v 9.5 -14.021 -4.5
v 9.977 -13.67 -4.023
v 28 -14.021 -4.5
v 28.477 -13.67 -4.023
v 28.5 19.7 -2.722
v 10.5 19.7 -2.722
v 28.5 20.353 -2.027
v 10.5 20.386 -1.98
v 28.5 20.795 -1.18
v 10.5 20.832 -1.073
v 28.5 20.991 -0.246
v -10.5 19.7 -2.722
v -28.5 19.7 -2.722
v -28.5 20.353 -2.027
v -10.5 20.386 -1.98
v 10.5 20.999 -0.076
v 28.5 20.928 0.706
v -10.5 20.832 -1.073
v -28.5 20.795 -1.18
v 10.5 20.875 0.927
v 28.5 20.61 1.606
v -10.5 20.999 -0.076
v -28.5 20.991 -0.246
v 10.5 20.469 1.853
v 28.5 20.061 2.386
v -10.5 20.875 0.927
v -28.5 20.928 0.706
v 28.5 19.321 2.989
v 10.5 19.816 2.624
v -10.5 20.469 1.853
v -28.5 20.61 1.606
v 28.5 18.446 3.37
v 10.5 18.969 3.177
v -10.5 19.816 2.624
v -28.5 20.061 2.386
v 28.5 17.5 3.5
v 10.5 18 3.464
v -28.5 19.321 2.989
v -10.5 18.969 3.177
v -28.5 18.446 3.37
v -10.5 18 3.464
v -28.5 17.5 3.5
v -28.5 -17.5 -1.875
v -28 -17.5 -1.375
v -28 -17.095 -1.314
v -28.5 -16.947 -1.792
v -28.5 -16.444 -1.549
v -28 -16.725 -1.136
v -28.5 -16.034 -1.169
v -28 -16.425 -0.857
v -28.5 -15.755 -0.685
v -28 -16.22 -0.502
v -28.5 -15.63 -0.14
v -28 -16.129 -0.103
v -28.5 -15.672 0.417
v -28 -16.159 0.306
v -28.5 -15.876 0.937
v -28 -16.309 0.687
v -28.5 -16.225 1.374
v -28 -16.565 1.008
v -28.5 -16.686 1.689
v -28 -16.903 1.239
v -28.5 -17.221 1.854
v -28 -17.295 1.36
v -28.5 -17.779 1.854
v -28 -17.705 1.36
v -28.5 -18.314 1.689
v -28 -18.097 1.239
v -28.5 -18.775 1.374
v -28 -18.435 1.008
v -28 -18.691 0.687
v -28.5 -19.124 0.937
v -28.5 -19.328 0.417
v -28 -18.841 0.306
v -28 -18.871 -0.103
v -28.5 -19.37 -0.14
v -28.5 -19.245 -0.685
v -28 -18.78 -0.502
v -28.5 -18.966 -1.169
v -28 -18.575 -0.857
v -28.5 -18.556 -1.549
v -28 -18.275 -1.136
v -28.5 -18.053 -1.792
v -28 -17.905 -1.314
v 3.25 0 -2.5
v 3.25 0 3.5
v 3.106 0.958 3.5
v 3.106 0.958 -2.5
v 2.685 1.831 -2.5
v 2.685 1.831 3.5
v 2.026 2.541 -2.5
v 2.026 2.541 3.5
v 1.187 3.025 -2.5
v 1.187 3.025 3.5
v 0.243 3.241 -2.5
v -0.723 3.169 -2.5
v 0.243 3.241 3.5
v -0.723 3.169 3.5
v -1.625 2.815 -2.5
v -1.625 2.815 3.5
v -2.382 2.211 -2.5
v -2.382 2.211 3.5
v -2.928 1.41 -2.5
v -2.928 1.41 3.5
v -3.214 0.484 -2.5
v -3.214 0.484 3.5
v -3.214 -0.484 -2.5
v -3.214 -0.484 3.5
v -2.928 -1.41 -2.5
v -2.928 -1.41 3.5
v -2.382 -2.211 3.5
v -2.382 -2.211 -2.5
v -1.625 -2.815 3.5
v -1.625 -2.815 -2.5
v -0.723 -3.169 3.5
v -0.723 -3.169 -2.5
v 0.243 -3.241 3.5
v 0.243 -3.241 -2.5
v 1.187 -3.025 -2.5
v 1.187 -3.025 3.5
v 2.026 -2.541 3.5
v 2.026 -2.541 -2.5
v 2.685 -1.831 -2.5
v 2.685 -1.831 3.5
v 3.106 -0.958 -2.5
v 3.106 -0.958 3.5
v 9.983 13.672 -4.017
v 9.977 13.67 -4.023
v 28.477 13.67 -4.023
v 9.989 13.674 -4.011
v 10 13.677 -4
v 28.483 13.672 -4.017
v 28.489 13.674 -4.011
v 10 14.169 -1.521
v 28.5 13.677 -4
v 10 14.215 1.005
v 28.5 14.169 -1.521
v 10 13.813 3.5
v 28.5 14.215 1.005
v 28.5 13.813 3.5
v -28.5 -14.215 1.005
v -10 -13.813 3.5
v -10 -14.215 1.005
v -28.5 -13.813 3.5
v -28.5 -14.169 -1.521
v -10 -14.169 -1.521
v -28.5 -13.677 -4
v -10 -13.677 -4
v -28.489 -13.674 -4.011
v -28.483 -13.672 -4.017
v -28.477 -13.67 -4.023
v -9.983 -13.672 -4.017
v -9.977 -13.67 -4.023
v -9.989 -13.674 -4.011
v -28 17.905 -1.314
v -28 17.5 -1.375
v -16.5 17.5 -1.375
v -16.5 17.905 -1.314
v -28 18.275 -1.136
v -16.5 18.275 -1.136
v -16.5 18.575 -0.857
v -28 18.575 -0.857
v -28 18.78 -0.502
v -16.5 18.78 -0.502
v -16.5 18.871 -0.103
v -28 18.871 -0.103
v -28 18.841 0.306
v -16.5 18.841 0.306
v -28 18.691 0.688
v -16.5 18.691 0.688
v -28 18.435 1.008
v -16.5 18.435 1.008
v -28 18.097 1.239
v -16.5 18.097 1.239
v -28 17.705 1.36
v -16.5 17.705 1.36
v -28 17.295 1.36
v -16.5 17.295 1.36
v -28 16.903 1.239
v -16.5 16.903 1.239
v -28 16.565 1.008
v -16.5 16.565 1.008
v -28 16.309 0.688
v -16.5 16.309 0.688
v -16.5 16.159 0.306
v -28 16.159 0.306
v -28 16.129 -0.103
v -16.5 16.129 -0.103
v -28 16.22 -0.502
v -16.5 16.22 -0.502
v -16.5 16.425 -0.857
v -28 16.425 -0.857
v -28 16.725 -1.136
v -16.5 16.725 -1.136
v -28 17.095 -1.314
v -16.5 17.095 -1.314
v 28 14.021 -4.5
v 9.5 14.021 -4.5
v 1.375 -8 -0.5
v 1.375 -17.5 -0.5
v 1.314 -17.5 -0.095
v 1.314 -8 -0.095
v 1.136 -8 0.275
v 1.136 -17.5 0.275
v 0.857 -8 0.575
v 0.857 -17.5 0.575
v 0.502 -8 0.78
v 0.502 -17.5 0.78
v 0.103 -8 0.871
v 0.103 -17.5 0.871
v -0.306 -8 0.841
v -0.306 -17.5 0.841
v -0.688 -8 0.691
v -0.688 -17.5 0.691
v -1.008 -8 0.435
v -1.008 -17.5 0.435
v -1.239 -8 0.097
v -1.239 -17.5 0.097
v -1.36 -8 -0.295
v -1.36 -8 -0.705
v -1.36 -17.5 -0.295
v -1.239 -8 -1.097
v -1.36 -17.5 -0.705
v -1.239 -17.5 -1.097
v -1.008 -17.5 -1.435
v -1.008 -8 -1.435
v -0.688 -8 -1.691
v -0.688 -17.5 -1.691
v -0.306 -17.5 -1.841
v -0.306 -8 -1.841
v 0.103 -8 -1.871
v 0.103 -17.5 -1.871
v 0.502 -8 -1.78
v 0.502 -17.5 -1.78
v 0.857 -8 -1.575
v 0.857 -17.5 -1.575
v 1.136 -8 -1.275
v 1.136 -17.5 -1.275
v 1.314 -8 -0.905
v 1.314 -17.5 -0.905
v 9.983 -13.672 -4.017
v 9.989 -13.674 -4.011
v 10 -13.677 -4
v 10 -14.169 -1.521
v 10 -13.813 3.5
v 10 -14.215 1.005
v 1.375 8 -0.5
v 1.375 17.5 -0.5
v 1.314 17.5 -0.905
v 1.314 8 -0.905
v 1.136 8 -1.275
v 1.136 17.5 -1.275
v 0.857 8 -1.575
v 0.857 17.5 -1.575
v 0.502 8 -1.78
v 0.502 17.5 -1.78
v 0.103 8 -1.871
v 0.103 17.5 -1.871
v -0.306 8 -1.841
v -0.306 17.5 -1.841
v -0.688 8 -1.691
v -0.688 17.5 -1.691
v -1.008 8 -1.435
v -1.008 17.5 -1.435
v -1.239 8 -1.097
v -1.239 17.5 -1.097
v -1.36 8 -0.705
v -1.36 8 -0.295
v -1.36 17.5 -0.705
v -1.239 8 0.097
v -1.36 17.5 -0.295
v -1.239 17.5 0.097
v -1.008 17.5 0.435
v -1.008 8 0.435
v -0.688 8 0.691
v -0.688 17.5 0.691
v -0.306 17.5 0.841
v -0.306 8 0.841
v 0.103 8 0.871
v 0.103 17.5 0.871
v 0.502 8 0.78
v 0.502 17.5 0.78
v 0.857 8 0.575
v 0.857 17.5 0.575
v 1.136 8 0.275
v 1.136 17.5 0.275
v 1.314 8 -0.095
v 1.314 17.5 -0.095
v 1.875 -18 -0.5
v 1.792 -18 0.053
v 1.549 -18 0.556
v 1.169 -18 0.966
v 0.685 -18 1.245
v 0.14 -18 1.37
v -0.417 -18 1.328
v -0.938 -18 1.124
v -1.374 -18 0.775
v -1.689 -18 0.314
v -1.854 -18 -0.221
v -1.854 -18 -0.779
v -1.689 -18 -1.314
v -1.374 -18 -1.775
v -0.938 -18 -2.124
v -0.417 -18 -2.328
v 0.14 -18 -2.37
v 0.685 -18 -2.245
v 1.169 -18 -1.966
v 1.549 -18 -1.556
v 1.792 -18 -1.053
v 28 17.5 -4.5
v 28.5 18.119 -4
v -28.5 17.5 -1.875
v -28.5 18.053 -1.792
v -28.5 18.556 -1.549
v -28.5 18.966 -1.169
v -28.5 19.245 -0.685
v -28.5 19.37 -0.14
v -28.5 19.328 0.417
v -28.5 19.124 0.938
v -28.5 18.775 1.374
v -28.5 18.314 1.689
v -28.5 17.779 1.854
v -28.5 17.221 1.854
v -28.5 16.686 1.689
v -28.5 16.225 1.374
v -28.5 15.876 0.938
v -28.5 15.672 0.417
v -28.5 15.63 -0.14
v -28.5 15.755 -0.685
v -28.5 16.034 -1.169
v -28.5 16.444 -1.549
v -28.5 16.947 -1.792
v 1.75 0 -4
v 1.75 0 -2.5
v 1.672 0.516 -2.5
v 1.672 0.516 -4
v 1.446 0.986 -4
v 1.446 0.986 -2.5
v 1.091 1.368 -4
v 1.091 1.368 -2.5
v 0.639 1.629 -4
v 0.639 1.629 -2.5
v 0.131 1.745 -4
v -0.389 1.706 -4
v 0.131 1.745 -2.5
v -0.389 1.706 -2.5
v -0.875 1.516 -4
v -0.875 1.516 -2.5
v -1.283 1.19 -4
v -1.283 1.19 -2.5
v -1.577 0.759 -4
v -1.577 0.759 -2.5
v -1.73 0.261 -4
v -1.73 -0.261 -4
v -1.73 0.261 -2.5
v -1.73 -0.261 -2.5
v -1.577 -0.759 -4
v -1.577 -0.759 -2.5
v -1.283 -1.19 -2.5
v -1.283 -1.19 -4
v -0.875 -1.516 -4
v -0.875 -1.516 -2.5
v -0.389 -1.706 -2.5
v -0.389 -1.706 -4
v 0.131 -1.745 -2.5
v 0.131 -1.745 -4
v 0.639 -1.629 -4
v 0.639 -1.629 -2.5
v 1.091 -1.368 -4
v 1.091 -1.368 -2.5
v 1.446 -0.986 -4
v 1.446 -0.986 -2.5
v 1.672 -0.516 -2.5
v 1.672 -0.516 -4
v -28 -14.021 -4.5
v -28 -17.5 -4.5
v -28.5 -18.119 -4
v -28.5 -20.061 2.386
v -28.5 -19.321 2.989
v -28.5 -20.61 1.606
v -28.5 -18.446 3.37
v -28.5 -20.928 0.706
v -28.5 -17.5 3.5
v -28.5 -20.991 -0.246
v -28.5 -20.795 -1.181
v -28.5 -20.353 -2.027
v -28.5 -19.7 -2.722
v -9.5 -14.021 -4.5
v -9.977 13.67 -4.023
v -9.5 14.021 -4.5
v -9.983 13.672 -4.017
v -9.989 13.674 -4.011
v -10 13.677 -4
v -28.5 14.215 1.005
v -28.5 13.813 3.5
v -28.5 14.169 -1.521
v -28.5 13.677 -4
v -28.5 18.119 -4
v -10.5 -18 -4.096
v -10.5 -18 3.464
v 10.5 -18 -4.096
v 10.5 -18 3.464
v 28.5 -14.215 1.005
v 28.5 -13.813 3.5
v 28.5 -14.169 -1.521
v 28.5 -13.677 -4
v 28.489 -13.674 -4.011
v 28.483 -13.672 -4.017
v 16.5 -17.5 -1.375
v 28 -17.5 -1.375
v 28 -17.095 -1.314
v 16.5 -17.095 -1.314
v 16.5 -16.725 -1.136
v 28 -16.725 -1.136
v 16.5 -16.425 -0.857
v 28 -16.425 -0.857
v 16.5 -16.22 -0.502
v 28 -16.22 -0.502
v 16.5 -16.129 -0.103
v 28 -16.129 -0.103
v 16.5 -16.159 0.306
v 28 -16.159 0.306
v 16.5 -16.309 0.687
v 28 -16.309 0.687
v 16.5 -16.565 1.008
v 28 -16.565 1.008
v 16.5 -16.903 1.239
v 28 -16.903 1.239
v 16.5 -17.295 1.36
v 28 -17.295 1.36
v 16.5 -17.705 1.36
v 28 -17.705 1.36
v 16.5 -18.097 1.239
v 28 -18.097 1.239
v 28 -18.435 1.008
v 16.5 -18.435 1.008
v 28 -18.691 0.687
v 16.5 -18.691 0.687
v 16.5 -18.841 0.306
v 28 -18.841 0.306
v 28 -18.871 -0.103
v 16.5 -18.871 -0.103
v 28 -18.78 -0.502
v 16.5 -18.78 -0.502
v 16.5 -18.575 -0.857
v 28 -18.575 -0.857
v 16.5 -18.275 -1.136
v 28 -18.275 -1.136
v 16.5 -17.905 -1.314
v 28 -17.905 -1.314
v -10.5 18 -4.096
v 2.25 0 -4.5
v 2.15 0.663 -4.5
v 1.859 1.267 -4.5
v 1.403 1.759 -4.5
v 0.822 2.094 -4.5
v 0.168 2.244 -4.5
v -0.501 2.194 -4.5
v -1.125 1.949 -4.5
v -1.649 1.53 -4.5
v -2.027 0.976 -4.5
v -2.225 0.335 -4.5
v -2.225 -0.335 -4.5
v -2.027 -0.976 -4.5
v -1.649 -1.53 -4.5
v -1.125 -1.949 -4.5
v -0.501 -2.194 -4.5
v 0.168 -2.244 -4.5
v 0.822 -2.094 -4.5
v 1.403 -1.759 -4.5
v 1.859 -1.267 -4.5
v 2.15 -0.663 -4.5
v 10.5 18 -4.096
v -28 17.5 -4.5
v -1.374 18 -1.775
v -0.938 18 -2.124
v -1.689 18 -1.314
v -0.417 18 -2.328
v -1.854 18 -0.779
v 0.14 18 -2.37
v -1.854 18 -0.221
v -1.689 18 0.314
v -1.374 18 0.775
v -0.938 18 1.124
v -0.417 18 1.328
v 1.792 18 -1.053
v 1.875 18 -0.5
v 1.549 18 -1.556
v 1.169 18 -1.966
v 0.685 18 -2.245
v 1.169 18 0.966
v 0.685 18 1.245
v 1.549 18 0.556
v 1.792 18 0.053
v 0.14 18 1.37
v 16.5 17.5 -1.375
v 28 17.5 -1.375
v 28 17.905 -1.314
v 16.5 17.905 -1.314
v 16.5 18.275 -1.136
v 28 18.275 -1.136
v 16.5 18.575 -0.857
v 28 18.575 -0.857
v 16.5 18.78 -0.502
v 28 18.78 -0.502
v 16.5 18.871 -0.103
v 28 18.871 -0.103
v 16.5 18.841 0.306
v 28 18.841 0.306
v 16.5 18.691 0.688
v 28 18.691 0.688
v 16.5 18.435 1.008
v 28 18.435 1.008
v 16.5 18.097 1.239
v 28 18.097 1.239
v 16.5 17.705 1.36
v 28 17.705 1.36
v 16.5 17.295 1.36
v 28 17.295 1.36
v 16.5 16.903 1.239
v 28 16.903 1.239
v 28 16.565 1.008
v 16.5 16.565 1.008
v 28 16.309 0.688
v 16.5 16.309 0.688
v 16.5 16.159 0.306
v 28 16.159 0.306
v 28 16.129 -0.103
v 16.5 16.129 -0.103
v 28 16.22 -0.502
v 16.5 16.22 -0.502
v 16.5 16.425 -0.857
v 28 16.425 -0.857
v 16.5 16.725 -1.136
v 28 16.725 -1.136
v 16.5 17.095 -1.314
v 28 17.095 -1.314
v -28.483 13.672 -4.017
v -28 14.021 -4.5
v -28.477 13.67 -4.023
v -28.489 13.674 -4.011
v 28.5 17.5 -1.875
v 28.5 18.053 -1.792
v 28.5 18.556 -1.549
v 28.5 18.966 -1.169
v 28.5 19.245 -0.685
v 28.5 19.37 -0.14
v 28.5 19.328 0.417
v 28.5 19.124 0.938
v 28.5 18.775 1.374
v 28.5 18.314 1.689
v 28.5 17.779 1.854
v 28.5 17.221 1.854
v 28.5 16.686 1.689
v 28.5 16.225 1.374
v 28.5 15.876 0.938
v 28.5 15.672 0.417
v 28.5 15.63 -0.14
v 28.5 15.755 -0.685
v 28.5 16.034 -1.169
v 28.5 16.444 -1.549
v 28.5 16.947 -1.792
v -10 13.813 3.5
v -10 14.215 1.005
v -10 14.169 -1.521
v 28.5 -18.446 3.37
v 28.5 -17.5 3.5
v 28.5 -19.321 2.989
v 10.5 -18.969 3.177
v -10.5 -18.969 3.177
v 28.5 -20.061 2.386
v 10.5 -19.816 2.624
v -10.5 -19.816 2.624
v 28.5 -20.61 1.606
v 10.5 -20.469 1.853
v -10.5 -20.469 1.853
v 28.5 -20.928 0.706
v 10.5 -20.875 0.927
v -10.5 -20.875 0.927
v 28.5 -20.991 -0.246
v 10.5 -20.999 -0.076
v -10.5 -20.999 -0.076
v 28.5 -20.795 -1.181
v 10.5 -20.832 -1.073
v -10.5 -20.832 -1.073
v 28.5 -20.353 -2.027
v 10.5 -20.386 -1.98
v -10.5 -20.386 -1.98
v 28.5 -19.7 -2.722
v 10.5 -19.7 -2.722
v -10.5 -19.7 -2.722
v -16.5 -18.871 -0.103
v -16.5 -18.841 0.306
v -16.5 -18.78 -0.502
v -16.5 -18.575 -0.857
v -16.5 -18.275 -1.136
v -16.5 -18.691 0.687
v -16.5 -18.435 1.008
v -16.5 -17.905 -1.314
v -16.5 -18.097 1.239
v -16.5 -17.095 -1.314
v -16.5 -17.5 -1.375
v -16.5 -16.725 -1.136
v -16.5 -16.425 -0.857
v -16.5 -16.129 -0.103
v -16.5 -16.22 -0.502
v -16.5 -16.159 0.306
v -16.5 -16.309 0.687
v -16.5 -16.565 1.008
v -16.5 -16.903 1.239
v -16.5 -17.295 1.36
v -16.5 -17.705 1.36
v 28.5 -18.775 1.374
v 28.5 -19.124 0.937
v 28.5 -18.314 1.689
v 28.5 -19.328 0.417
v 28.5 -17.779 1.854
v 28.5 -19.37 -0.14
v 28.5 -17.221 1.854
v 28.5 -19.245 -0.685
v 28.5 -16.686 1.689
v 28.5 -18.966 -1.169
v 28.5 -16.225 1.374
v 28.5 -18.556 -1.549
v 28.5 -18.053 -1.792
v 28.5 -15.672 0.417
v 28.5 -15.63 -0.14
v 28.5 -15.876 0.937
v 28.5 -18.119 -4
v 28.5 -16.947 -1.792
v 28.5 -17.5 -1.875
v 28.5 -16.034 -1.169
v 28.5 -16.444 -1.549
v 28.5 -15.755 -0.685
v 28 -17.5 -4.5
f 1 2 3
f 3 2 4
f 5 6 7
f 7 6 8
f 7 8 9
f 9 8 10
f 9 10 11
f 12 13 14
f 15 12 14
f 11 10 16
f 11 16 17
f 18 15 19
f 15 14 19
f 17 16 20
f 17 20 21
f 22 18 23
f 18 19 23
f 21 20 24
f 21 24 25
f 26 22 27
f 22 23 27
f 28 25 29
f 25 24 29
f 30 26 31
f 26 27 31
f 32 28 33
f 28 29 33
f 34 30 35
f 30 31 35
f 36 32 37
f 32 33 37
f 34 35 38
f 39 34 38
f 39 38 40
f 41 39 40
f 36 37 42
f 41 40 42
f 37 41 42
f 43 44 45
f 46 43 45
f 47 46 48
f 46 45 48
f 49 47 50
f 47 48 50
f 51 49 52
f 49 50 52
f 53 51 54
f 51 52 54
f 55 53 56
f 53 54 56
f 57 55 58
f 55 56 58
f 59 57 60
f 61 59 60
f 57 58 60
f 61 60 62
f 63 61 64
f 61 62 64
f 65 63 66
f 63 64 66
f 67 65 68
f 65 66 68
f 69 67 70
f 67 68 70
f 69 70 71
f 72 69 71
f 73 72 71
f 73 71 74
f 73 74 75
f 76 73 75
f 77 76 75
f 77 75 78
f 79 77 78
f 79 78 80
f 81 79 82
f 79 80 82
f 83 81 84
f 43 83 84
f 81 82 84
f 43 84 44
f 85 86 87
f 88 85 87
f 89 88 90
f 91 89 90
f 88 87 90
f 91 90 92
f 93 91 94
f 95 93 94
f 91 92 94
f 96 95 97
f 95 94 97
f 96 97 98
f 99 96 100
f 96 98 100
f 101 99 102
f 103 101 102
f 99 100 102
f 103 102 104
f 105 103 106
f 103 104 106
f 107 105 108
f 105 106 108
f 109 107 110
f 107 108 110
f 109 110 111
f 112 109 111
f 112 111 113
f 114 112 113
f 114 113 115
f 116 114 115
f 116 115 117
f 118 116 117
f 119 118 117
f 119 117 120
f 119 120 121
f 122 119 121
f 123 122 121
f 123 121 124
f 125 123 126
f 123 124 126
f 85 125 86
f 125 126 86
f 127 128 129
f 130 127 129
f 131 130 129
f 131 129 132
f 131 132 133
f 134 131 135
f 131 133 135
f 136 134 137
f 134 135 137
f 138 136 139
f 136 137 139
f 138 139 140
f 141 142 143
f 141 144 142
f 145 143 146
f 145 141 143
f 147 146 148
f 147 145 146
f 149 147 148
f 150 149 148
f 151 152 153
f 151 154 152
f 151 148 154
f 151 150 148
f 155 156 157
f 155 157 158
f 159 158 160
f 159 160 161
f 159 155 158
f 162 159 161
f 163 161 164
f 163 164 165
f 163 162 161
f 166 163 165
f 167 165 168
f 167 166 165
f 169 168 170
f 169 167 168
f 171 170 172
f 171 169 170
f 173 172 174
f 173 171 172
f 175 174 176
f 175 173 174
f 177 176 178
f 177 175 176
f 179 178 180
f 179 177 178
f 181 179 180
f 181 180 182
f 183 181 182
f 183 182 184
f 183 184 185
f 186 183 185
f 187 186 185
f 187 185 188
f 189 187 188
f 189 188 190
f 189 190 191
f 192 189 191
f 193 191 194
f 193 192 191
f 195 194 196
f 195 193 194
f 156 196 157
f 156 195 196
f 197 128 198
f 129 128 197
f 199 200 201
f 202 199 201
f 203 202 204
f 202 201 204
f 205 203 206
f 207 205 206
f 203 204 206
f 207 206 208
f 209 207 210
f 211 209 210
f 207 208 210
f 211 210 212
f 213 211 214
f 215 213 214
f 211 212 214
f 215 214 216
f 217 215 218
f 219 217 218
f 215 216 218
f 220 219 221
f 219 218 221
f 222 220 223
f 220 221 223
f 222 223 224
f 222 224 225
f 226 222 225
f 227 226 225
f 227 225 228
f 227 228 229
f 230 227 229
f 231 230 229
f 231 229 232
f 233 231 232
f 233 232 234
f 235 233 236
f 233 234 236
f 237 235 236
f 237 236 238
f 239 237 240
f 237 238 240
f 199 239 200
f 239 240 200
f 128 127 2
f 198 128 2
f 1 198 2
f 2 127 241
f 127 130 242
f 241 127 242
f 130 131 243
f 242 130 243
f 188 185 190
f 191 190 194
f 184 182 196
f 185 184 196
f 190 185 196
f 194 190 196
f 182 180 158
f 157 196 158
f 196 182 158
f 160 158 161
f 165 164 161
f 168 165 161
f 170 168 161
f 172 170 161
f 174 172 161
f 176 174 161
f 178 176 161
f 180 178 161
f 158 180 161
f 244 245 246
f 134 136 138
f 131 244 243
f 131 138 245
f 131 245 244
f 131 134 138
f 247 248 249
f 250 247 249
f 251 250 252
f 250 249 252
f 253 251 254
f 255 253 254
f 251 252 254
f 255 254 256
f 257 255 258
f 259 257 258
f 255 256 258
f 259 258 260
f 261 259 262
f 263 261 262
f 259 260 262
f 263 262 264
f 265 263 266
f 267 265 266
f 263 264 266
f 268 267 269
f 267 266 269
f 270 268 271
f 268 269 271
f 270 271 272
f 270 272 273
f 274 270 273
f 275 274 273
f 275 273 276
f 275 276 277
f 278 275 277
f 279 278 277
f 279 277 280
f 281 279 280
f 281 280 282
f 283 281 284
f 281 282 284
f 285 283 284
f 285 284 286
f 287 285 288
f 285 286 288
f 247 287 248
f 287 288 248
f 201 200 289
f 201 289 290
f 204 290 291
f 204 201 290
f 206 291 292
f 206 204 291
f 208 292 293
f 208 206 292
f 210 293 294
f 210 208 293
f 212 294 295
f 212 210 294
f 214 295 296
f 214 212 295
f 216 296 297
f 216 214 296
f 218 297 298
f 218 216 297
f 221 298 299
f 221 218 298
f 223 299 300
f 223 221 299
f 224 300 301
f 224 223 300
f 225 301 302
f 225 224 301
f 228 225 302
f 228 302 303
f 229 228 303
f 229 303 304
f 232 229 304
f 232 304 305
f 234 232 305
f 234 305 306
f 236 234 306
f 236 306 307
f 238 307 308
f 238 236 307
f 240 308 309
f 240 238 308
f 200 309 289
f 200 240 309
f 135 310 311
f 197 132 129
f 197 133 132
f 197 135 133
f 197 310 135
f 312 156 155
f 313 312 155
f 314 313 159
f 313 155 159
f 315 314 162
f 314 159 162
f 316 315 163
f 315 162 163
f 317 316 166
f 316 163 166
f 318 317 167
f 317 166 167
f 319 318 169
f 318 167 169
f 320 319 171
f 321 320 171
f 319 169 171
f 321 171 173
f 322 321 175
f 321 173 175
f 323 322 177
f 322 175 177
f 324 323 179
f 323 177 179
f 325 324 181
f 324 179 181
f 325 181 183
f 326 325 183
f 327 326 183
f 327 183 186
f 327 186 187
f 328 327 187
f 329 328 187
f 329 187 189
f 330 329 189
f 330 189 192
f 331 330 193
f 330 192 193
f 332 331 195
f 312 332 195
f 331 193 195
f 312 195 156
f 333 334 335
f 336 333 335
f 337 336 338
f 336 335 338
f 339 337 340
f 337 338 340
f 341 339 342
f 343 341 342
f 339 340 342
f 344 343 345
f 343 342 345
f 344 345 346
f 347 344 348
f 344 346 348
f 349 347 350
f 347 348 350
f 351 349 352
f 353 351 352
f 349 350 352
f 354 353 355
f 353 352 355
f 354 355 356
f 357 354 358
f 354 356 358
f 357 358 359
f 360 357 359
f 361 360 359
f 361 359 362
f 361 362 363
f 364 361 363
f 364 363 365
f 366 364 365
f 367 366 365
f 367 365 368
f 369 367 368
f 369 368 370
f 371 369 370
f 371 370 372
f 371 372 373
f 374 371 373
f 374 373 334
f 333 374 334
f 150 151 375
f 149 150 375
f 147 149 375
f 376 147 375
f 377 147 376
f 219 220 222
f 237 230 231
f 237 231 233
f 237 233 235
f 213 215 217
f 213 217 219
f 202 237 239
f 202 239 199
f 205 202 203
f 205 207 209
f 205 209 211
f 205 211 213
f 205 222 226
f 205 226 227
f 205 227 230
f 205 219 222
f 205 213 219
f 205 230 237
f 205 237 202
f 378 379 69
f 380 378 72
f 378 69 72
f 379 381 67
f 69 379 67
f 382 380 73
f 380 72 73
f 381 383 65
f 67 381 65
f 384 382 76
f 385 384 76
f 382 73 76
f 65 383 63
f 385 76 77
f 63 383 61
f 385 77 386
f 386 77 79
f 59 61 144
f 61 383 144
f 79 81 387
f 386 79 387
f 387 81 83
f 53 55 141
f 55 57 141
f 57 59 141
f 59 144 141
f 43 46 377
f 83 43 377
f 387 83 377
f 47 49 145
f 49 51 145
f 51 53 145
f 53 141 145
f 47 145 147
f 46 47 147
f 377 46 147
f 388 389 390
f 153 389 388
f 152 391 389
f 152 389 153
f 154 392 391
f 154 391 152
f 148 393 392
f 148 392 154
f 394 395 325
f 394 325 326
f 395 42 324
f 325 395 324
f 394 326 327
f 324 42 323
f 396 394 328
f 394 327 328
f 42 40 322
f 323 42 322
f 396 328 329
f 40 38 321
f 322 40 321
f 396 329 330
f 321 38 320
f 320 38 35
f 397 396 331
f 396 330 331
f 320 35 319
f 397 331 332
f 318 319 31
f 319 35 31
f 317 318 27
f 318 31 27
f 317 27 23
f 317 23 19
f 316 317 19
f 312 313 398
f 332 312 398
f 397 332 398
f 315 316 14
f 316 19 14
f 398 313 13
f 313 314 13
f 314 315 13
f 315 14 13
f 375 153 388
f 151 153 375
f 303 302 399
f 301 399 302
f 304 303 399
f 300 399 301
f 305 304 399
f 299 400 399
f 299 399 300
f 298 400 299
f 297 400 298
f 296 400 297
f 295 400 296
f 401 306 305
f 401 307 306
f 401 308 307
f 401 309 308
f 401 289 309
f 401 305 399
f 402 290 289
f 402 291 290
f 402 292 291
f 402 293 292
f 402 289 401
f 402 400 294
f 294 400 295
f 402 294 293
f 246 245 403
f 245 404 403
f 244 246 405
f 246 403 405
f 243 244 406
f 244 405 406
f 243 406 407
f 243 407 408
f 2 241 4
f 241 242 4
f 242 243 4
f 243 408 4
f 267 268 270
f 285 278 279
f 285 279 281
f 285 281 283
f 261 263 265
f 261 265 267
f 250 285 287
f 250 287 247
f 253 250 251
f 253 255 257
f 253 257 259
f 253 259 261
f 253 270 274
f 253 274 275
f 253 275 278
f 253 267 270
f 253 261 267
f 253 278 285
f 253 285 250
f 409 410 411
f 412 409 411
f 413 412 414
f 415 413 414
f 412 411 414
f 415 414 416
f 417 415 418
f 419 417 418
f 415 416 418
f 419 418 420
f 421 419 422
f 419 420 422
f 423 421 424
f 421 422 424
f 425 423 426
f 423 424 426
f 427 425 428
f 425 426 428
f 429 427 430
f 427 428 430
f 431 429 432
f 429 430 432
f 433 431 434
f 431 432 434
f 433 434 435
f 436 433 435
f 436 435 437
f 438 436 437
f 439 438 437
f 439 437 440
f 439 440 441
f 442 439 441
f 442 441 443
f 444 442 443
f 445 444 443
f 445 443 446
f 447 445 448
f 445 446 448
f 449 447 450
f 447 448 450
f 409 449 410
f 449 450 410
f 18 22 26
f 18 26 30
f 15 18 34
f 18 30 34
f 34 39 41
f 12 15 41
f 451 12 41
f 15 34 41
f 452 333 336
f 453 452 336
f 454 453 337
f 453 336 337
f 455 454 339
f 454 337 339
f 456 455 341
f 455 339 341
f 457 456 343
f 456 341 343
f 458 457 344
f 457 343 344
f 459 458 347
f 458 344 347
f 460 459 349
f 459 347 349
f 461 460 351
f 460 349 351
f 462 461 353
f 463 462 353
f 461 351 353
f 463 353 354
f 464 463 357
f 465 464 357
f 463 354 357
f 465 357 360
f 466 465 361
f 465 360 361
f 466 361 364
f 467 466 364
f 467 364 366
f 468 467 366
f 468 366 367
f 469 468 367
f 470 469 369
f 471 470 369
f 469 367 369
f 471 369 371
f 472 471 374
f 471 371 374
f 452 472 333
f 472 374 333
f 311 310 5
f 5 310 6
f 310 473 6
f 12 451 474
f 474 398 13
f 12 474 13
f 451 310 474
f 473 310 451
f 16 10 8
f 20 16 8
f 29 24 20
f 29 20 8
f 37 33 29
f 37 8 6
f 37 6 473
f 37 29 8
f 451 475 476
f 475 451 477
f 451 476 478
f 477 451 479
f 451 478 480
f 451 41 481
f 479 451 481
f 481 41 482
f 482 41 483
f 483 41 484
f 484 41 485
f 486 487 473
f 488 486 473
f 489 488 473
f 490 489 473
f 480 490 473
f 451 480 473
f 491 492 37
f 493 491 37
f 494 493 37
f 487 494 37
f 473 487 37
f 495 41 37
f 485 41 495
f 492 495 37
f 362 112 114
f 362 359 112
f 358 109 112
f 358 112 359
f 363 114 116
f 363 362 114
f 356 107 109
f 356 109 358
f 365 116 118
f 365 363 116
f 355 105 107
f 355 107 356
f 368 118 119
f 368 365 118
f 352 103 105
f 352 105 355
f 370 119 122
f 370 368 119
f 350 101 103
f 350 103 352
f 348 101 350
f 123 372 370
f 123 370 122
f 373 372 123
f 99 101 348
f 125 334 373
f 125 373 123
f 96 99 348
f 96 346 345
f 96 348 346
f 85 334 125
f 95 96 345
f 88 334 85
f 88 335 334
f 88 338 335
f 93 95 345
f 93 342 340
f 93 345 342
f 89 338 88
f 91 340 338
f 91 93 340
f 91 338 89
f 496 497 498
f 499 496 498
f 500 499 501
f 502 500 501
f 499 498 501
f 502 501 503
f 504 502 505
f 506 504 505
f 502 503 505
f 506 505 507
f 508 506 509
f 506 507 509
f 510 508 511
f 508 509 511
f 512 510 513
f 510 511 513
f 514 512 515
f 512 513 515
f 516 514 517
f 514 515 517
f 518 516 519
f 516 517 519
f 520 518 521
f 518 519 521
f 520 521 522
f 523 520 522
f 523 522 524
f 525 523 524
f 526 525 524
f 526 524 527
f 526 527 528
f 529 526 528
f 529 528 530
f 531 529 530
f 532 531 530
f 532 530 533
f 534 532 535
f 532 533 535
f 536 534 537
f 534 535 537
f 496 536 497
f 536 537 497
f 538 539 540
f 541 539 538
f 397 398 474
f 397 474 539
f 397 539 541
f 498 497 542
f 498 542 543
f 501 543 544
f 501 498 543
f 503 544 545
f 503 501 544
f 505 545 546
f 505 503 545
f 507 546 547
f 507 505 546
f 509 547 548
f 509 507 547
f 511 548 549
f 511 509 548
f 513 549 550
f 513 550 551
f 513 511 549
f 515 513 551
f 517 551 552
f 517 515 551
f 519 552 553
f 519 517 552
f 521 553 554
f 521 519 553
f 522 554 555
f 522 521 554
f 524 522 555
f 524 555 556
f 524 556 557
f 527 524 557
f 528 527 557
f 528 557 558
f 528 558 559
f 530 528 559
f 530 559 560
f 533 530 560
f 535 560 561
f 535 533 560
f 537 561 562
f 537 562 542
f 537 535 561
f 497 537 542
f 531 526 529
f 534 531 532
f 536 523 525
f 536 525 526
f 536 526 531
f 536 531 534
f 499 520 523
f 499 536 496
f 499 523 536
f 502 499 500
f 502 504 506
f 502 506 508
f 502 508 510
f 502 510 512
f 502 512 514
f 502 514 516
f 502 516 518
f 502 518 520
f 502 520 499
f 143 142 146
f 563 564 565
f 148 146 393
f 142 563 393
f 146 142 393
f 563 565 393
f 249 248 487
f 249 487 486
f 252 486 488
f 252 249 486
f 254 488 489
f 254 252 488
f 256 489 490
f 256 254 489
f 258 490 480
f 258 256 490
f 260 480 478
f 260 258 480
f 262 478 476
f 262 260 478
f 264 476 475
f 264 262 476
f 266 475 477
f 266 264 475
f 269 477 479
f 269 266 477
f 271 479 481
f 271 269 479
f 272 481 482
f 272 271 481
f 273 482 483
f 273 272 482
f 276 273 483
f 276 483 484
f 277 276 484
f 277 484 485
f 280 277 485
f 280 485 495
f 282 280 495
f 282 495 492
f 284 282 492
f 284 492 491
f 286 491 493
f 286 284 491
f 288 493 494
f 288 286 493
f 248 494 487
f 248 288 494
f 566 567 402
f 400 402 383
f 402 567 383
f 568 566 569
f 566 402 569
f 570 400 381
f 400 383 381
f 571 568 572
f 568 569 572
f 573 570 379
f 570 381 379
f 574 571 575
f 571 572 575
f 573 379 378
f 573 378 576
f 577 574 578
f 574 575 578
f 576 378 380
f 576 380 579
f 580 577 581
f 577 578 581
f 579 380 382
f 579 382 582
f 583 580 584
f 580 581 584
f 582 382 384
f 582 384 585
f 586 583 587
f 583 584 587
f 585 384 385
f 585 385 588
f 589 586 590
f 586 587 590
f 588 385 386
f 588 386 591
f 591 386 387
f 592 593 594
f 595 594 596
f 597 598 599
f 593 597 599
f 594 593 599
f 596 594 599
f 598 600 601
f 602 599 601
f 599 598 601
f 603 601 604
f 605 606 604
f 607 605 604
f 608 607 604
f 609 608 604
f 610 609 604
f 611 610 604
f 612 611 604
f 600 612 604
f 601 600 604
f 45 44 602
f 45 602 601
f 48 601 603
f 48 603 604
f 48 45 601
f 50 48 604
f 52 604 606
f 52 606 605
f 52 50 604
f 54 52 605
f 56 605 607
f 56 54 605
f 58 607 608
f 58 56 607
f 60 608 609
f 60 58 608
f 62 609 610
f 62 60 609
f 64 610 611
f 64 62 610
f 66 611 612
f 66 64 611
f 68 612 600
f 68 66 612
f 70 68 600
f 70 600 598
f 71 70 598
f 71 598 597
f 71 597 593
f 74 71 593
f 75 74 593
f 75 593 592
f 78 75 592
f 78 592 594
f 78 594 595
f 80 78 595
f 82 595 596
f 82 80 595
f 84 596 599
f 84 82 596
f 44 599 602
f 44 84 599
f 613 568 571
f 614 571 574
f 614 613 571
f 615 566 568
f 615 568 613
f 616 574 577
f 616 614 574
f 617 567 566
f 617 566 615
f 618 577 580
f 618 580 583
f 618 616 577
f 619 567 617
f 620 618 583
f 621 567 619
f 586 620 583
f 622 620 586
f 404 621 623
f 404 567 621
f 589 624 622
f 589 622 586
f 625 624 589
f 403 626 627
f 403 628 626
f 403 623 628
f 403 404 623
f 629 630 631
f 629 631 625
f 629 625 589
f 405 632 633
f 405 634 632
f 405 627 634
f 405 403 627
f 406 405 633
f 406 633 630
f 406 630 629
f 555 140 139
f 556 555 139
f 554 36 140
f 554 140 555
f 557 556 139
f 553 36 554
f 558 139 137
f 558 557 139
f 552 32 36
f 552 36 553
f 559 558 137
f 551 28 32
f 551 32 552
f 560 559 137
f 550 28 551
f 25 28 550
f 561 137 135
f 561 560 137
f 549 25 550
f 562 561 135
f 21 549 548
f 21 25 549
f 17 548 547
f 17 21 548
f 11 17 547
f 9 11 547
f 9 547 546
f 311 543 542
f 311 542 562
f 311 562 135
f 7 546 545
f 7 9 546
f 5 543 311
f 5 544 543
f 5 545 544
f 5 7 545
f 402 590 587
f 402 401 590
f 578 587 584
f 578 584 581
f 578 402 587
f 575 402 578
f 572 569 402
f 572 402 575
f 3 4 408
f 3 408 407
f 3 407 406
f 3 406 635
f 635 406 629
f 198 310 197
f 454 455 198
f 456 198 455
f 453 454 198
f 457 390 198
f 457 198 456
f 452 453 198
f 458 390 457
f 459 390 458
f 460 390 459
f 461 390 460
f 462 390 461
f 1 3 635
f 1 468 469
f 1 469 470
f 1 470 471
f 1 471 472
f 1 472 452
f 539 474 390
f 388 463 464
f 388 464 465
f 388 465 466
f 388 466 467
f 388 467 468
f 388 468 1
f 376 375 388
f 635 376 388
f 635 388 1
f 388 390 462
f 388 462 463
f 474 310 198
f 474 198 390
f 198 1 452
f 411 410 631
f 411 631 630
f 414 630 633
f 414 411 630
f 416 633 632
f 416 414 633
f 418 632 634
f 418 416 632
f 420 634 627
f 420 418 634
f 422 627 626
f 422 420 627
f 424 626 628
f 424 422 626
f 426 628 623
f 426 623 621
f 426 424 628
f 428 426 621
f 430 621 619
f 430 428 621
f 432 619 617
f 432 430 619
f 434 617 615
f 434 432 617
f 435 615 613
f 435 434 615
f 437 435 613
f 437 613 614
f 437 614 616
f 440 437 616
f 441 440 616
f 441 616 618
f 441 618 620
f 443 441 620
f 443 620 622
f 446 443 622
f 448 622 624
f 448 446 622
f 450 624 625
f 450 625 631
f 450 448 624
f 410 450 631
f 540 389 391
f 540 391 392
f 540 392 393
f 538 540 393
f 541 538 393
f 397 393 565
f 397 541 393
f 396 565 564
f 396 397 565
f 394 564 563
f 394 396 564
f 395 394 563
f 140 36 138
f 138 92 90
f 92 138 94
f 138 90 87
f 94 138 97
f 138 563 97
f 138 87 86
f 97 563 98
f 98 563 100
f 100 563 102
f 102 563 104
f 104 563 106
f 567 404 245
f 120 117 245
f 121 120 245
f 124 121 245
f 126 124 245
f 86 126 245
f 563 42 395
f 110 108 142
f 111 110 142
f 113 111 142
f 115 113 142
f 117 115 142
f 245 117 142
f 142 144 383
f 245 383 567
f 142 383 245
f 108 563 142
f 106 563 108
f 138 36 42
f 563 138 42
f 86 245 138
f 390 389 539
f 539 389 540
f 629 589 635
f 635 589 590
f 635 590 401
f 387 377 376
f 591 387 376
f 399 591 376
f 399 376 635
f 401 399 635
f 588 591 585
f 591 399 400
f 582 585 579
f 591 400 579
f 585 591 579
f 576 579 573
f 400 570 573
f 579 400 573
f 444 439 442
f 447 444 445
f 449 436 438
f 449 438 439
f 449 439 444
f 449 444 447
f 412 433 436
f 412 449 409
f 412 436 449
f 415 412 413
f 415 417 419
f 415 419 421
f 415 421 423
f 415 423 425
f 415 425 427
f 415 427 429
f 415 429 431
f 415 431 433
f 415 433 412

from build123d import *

# Parameters (mm, degrees)
PAD_DEPTH           = 28.5
SKETCH001_R         = 14.25
POCKET_DEPTH        = 18.5
SKETCH002_R         = 1.375
POCKET001_DEPTH     = 12
SKETCH003_W         = 4
SKETCH003_H         = 10.5
POCKET002_DEPTH     = 8
SKETCH004_R         = 1.75
POCKET003_DEPTH     = 8
SKETCH005_R         = 3.25
POCKET004_DEPTH     = 6
SKETCH006_R         = 1.375
POCKET005_DEPTH     = 10
SKETCH007_R         = 1.375
POCKET006_DEPTH     = 10
CHAMFER_SIZE        = 0.5
CHAMFER001_SIZE     = 0.5
CLONE001_ROLL_ANGLE = -90


with BuildPart() as recess_pocket:
    # Sketch → Pad (new body)
    with BuildSketch(Plane.YZ):
        with BuildLine():
            ThreePointArc((2.722222, 19.699888), (-1.166667, 20.799832), (-3.5, 17.5))
            Line((-3.5, 17.5), (-3.5, -17.5))
            ThreePointArc((-3.5, -17.5), (-1.166657, -20.799835), (2.722235, -19.699872))
            Line((2.722235, -19.699872), (4.5, -17.5))
            Line((4.5, 17.5), (4.5, -17.5))
            Line((4.5, 17.5), (2.722222, 19.699888))
        make_face()
    extrude(amount=PAD_DEPTH)

    # Sketch001 → Pocket (cut)
    with BuildSketch(Plane.YZ.offset(28.5)):
        Circle(SKETCH001_R)
    extrude(amount=-POCKET_DEPTH, mode=Mode.SUBTRACT)

    # Sketch002 → Pocket001 (cut)
    with BuildSketch(Plane.YZ.offset(28.5)):
        with Locations((0, -17.5)):
            Circle(SKETCH002_R)
        with Locations((0, 17.5)):
            Circle(SKETCH002_R)
    extrude(amount=-POCKET001_DEPTH, mode=Mode.SUBTRACT)

    # Sketch003 → Pocket002 (cut)
    with BuildSketch(Plane(origin=(0, -3.5, 0), x_dir=(0, 0, -1), z_dir=(0, -1, 0))):
        with Locations((-20, 5.25)):
            Rectangle(SKETCH003_W, SKETCH003_H)
        with Locations((20, 5.25)):
            Rectangle(SKETCH003_W, SKETCH003_H)
    extrude(amount=-POCKET002_DEPTH, mode=Mode.SUBTRACT)


with BuildPart() as motor_bracket_printing:
    # Part__Mirroring: instance of recess-pocket
    add(recess_pocket.part.mirror(Plane(origin=(0, 0, 0), x_dir=(0, -1, 0), z_dir=(1, 0, 0))))

    # Fusion: union recess-pocket
    add(recess_pocket.part)

    # Sketch004 → Pocket003 (cut)
    with BuildSketch(Plane.XZ.offset(3.5)):
        Circle(SKETCH004_R)
    extrude(amount=-POCKET003_DEPTH, mode=Mode.SUBTRACT)

    # Sketch005 → Pocket004 (cut)
    with BuildSketch(Plane.XZ.offset(3.5)):
        Circle(SKETCH005_R)
    extrude(amount=-POCKET004_DEPTH, mode=Mode.SUBTRACT)

    # Sketch006 → Pocket005 (cut)
    with BuildSketch(Plane.XY.offset(18)):
        with Locations((0, 0.5)):
            Circle(SKETCH006_R)
    extrude(amount=-POCKET005_DEPTH, mode=Mode.SUBTRACT)

    # Sketch007 → Pocket006 (cut)
    with BuildSketch(Plane(origin=(0, 0, -18), x_dir=(1, 0, 0), z_dir=(0, 0, -1))):
        with Locations((0, -0.5)):
            Circle(SKETCH007_R)
    extrude(amount=-POCKET006_DEPTH, mode=Mode.SUBTRACT)

    # Chamfer
    chamfer_edges = [motor_bracket_printing.edges().sort_by_distance(p)[0] for p in [
        (28.5, -1.375, -17.5),
        (-28.5, -1.375, -17.5),
        (-28.5, -1.375, 17.5),
        (28.5, -1.375, 17.5),
        (-1.375, 0.5, -18),
        (-1.375, 0.5, 18),
    ]]
    chamfer(chamfer_edges, length=CHAMFER_SIZE)

    # Chamfer001
    chamfer001_edges = [motor_bracket_printing.edges().sort_by_distance(p)[0] for p in [
        (28.5, 4.5, -15.510409),
        (19.25, 4.5, -13.520817),
        (-10, 4.5, 0),
        (-19.25, 4.5, -13.520817),
        (-19.25, 4.5, 13.520817),
        (-28.5, 4.5, -15.510409),
        (-28.5, 4.5, 15.510409),
        (28.5, 4.5, 15.510409),
        (19.25, 4.5, 13.520817),
        (10, 4.5, 0),
        (-1.75, 4.5, 0),
    ]]
    chamfer(chamfer001_edges, length=CHAMFER001_SIZE)


with BuildPart() as motor_bracket_printing_1:
    # Clone001 roll: moved
    add(motor_bracket_printing.part.rotate(Axis((0, 0, 0), (1, 0, 0)), CLONE001_ROLL_ANGLE))


with BuildPart() as motor_bracket_printing_2:
    # Clone001 placement: moved
    add(motor_bracket_printing_1.part)


solid = motor_bracket_printing_2.part
